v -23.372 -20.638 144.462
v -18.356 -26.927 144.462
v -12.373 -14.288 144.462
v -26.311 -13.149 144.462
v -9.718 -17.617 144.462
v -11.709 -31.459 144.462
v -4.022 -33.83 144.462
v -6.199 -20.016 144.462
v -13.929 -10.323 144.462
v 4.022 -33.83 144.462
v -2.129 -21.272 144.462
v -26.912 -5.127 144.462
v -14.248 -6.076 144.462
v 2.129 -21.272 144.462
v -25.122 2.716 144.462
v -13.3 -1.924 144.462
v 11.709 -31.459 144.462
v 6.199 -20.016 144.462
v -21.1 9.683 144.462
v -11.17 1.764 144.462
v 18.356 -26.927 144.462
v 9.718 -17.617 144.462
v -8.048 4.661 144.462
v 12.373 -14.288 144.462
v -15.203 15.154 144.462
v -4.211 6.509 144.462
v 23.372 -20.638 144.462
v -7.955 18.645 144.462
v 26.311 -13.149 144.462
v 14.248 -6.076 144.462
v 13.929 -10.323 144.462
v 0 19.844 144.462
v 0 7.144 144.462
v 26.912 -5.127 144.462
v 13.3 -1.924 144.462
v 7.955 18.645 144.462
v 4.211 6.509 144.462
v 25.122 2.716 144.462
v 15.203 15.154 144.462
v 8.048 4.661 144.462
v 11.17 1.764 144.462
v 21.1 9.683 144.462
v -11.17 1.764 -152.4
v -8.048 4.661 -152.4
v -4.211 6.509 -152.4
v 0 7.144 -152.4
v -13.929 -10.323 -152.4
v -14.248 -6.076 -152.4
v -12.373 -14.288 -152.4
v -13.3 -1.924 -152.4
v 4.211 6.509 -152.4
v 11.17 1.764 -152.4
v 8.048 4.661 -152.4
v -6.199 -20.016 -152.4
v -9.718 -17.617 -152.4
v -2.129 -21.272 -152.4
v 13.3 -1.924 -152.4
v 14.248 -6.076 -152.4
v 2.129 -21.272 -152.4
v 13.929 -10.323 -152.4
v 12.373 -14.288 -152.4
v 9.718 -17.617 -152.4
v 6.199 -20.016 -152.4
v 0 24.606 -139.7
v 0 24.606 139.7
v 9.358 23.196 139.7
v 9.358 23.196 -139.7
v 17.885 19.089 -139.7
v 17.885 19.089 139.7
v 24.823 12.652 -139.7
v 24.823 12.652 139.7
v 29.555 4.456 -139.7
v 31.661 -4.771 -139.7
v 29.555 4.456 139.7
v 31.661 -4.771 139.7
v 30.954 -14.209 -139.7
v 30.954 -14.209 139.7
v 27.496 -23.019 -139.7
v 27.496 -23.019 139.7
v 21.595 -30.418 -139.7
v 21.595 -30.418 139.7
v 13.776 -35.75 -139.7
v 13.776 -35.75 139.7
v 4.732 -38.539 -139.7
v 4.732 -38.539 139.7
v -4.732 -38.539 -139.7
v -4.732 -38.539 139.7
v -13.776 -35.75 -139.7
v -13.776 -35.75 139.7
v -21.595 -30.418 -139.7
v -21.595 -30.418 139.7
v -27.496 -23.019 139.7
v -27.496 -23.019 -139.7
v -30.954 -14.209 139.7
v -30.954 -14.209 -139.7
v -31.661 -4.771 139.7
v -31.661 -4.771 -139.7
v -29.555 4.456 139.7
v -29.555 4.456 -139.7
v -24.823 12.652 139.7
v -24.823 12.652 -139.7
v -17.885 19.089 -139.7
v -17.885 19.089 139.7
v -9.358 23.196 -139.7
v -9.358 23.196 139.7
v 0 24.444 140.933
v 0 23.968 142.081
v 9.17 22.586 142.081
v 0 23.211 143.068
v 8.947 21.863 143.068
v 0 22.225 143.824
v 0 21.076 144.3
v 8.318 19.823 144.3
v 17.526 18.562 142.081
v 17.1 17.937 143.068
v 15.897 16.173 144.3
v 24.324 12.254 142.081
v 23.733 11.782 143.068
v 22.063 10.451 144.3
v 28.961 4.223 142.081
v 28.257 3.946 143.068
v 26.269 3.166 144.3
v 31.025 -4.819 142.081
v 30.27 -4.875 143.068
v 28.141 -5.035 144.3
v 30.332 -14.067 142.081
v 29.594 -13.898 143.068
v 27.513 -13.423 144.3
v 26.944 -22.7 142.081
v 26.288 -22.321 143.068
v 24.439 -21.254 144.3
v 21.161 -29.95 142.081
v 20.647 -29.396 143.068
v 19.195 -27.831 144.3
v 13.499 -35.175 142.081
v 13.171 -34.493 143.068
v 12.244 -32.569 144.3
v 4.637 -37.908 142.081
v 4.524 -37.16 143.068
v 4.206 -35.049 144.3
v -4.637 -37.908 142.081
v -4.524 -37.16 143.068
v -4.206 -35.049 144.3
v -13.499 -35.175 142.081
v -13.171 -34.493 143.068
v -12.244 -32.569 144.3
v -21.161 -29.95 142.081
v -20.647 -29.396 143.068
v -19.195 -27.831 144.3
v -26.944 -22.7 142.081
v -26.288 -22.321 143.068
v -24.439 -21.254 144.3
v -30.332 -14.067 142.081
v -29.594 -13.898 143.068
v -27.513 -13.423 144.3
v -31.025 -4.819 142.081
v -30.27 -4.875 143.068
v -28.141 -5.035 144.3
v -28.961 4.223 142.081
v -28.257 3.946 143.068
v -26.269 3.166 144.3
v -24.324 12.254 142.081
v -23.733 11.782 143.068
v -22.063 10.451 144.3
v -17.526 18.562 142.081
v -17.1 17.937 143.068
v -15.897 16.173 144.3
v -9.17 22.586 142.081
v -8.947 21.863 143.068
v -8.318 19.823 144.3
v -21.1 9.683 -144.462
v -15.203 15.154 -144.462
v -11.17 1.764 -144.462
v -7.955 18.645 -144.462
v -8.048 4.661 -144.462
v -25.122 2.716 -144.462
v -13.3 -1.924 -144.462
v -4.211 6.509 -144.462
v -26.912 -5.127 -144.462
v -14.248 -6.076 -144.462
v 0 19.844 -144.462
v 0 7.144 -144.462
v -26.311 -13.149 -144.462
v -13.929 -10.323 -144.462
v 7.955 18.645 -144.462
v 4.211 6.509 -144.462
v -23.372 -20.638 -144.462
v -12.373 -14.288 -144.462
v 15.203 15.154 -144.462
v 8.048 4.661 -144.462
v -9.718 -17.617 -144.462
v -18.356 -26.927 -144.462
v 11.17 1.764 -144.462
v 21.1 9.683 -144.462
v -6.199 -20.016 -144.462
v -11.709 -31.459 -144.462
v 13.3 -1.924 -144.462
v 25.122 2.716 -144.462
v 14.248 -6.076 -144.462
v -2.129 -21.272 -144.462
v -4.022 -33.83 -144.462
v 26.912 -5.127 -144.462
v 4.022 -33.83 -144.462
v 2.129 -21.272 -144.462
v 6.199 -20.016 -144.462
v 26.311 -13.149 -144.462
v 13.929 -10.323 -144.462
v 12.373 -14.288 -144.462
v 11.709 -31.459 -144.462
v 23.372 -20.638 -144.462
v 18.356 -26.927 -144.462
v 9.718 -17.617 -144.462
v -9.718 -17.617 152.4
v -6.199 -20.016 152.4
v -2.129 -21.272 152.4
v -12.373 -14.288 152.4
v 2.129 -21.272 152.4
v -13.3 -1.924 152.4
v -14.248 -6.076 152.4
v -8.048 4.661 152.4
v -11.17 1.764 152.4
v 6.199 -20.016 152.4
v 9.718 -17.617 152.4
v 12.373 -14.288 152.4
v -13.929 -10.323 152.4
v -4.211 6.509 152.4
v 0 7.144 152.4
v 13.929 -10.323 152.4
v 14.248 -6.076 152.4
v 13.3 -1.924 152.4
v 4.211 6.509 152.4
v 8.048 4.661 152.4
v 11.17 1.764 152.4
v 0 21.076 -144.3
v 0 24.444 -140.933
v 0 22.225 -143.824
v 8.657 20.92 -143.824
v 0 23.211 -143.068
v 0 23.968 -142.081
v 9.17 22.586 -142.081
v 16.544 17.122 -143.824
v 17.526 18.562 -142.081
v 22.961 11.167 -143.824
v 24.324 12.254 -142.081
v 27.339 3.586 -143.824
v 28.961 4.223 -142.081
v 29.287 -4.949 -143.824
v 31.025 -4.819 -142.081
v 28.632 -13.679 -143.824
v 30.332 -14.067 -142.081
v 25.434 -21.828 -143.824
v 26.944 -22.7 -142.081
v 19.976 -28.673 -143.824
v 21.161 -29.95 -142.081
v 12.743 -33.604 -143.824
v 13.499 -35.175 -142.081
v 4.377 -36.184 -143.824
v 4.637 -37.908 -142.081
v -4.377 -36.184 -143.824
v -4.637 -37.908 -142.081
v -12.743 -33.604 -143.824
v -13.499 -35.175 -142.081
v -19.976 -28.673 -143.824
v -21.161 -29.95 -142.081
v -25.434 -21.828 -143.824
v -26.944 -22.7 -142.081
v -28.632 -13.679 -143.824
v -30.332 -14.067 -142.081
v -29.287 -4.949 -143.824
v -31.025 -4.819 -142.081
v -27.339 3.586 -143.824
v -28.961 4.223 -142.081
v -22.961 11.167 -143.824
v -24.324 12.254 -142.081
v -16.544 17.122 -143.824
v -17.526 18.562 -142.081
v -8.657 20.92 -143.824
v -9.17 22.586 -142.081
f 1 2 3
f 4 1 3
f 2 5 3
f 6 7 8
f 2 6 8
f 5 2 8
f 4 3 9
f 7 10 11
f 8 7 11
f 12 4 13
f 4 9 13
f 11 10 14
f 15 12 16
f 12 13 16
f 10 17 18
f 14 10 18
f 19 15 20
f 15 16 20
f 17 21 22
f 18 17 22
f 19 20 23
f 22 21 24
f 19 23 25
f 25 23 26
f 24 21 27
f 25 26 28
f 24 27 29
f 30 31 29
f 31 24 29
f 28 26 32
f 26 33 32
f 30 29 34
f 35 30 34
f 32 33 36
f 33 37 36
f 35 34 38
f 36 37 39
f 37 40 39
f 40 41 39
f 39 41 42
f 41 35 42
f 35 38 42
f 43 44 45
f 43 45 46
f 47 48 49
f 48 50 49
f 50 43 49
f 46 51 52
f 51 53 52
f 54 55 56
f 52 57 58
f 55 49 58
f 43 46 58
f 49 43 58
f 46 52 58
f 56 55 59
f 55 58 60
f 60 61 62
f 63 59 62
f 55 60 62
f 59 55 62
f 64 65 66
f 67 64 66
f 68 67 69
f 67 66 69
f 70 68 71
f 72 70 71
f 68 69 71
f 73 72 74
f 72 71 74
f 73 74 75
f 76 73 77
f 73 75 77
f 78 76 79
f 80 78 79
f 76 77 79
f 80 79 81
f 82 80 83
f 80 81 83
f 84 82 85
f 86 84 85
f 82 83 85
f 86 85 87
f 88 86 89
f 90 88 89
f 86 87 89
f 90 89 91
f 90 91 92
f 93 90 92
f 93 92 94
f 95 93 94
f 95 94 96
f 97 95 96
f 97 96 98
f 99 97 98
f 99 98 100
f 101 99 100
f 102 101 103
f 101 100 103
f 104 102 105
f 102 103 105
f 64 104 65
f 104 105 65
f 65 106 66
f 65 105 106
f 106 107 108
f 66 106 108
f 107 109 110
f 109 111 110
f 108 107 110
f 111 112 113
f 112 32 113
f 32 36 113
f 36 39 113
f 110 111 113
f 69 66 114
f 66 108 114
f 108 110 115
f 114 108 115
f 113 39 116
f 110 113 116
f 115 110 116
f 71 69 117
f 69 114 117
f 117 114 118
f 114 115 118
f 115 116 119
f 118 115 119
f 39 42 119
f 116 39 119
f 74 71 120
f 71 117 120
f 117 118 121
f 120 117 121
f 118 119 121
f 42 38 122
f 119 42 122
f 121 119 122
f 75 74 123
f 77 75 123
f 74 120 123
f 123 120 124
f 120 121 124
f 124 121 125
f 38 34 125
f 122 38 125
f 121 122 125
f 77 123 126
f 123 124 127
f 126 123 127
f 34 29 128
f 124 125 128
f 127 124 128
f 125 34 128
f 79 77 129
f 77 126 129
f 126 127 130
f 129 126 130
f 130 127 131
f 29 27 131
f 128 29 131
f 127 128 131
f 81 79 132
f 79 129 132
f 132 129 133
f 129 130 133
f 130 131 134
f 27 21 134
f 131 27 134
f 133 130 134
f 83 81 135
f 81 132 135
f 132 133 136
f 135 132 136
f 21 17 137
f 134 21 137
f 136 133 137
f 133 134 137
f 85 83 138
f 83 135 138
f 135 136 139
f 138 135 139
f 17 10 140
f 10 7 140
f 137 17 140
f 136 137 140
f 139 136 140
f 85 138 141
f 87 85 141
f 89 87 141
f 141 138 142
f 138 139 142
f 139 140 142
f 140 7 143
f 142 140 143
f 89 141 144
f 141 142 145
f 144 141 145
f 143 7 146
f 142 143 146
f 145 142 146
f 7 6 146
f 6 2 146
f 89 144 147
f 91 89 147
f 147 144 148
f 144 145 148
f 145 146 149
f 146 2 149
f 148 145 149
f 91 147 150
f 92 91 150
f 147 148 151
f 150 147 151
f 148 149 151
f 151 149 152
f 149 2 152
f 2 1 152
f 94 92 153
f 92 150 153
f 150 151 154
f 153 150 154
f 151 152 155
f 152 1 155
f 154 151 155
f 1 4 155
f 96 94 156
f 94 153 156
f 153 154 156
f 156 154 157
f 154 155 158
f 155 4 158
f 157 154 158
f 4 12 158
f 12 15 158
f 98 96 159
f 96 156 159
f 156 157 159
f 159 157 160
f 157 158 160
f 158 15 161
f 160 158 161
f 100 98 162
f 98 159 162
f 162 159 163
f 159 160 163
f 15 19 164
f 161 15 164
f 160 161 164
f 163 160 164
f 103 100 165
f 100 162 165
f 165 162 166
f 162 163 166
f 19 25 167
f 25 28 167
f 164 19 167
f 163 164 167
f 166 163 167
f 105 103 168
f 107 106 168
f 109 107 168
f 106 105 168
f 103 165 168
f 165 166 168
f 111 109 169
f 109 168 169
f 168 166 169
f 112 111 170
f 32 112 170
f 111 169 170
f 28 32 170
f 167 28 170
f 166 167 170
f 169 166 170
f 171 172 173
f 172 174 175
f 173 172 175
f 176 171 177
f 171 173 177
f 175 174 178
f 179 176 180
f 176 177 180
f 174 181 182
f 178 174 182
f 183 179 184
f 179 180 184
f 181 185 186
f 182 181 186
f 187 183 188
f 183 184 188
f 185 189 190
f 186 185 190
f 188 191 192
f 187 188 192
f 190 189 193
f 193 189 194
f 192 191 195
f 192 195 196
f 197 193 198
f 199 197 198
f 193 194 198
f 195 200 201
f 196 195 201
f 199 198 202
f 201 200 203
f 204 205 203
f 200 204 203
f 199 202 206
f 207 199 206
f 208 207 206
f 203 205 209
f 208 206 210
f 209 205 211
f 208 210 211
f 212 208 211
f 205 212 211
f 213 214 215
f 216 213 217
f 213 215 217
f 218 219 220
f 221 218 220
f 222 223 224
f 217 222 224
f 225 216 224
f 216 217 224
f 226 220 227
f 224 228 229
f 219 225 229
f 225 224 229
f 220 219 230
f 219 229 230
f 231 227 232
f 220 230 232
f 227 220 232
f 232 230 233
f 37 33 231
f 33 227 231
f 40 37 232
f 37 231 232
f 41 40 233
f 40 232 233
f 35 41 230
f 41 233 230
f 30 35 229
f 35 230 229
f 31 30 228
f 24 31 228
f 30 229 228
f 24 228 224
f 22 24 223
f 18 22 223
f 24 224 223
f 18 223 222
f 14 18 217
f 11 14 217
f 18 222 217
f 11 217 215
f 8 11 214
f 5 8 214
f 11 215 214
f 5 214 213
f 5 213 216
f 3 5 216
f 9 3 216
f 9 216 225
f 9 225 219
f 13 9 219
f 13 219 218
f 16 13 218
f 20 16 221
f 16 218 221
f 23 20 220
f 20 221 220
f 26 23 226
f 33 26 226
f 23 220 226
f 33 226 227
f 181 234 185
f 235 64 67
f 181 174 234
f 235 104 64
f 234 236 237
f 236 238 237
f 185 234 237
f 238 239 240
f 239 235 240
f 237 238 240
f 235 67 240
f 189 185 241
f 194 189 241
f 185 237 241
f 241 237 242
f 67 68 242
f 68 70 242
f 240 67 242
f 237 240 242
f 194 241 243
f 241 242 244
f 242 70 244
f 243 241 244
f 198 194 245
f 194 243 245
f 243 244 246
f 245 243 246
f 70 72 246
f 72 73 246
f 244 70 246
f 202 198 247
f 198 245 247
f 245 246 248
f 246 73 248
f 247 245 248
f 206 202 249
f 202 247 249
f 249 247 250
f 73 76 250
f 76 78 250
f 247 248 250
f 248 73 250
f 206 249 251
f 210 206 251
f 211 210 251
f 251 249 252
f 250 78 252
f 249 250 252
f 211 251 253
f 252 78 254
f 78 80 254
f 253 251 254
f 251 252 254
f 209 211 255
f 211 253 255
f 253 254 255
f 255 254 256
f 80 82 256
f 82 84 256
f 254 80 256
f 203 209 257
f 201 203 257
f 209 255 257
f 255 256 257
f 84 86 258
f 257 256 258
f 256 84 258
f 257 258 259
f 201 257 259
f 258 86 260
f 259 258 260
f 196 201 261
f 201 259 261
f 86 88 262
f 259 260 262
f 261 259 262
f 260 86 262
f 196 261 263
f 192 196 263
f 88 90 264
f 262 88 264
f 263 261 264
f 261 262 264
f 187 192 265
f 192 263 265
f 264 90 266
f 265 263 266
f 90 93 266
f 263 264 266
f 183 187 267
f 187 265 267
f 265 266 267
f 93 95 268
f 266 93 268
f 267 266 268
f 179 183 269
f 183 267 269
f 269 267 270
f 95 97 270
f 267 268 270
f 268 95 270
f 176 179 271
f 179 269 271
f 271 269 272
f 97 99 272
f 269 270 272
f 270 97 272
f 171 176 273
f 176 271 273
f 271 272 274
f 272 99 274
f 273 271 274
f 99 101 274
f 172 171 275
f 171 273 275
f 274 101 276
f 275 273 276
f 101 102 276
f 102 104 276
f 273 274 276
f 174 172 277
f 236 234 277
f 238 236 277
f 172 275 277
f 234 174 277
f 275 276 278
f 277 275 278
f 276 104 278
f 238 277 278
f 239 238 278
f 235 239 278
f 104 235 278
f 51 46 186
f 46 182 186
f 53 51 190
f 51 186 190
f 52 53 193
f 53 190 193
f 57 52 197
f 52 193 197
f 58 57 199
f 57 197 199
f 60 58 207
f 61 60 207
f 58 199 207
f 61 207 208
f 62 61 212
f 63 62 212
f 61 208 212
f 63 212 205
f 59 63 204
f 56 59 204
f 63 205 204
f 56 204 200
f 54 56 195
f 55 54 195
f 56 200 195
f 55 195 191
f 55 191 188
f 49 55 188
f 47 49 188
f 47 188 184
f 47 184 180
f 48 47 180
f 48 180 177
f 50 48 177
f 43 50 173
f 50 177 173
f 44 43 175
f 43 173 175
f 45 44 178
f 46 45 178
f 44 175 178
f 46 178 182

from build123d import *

# Parameters (mm, degrees)
FILLET1_R = 4.7625


with BuildPart() as part:
    # Sketch1 → Revolve1 (revolve)
    with BuildSketch(Plane(origin=(0, 0, 0), x_dir=(0, 0, -1), z_dir=(1, 0, 0))):
        Polygon((-152.4, -7.14375), (152.4, -7.14375), (152.4, 7.14375), (144.4625, 7.14375), (144.4625, 24.60625), (-144.4625, 24.60625), (-144.4625, 7.14375), (-152.4, 7.14375), align=None)
    revolve(axis=Axis((0, -7.14375, 152.4), (0, 0, -1)))

    # Fillet1
    fillet1_edges = [part.edges().sort_by_distance(p)[0] for p in [
        (0, -38.89375, -144.4625),
        (0, -38.89375, 144.4625),
    ]]
    fillet(fillet1_edges, radius=FILLET1_R)


solid = part.part
